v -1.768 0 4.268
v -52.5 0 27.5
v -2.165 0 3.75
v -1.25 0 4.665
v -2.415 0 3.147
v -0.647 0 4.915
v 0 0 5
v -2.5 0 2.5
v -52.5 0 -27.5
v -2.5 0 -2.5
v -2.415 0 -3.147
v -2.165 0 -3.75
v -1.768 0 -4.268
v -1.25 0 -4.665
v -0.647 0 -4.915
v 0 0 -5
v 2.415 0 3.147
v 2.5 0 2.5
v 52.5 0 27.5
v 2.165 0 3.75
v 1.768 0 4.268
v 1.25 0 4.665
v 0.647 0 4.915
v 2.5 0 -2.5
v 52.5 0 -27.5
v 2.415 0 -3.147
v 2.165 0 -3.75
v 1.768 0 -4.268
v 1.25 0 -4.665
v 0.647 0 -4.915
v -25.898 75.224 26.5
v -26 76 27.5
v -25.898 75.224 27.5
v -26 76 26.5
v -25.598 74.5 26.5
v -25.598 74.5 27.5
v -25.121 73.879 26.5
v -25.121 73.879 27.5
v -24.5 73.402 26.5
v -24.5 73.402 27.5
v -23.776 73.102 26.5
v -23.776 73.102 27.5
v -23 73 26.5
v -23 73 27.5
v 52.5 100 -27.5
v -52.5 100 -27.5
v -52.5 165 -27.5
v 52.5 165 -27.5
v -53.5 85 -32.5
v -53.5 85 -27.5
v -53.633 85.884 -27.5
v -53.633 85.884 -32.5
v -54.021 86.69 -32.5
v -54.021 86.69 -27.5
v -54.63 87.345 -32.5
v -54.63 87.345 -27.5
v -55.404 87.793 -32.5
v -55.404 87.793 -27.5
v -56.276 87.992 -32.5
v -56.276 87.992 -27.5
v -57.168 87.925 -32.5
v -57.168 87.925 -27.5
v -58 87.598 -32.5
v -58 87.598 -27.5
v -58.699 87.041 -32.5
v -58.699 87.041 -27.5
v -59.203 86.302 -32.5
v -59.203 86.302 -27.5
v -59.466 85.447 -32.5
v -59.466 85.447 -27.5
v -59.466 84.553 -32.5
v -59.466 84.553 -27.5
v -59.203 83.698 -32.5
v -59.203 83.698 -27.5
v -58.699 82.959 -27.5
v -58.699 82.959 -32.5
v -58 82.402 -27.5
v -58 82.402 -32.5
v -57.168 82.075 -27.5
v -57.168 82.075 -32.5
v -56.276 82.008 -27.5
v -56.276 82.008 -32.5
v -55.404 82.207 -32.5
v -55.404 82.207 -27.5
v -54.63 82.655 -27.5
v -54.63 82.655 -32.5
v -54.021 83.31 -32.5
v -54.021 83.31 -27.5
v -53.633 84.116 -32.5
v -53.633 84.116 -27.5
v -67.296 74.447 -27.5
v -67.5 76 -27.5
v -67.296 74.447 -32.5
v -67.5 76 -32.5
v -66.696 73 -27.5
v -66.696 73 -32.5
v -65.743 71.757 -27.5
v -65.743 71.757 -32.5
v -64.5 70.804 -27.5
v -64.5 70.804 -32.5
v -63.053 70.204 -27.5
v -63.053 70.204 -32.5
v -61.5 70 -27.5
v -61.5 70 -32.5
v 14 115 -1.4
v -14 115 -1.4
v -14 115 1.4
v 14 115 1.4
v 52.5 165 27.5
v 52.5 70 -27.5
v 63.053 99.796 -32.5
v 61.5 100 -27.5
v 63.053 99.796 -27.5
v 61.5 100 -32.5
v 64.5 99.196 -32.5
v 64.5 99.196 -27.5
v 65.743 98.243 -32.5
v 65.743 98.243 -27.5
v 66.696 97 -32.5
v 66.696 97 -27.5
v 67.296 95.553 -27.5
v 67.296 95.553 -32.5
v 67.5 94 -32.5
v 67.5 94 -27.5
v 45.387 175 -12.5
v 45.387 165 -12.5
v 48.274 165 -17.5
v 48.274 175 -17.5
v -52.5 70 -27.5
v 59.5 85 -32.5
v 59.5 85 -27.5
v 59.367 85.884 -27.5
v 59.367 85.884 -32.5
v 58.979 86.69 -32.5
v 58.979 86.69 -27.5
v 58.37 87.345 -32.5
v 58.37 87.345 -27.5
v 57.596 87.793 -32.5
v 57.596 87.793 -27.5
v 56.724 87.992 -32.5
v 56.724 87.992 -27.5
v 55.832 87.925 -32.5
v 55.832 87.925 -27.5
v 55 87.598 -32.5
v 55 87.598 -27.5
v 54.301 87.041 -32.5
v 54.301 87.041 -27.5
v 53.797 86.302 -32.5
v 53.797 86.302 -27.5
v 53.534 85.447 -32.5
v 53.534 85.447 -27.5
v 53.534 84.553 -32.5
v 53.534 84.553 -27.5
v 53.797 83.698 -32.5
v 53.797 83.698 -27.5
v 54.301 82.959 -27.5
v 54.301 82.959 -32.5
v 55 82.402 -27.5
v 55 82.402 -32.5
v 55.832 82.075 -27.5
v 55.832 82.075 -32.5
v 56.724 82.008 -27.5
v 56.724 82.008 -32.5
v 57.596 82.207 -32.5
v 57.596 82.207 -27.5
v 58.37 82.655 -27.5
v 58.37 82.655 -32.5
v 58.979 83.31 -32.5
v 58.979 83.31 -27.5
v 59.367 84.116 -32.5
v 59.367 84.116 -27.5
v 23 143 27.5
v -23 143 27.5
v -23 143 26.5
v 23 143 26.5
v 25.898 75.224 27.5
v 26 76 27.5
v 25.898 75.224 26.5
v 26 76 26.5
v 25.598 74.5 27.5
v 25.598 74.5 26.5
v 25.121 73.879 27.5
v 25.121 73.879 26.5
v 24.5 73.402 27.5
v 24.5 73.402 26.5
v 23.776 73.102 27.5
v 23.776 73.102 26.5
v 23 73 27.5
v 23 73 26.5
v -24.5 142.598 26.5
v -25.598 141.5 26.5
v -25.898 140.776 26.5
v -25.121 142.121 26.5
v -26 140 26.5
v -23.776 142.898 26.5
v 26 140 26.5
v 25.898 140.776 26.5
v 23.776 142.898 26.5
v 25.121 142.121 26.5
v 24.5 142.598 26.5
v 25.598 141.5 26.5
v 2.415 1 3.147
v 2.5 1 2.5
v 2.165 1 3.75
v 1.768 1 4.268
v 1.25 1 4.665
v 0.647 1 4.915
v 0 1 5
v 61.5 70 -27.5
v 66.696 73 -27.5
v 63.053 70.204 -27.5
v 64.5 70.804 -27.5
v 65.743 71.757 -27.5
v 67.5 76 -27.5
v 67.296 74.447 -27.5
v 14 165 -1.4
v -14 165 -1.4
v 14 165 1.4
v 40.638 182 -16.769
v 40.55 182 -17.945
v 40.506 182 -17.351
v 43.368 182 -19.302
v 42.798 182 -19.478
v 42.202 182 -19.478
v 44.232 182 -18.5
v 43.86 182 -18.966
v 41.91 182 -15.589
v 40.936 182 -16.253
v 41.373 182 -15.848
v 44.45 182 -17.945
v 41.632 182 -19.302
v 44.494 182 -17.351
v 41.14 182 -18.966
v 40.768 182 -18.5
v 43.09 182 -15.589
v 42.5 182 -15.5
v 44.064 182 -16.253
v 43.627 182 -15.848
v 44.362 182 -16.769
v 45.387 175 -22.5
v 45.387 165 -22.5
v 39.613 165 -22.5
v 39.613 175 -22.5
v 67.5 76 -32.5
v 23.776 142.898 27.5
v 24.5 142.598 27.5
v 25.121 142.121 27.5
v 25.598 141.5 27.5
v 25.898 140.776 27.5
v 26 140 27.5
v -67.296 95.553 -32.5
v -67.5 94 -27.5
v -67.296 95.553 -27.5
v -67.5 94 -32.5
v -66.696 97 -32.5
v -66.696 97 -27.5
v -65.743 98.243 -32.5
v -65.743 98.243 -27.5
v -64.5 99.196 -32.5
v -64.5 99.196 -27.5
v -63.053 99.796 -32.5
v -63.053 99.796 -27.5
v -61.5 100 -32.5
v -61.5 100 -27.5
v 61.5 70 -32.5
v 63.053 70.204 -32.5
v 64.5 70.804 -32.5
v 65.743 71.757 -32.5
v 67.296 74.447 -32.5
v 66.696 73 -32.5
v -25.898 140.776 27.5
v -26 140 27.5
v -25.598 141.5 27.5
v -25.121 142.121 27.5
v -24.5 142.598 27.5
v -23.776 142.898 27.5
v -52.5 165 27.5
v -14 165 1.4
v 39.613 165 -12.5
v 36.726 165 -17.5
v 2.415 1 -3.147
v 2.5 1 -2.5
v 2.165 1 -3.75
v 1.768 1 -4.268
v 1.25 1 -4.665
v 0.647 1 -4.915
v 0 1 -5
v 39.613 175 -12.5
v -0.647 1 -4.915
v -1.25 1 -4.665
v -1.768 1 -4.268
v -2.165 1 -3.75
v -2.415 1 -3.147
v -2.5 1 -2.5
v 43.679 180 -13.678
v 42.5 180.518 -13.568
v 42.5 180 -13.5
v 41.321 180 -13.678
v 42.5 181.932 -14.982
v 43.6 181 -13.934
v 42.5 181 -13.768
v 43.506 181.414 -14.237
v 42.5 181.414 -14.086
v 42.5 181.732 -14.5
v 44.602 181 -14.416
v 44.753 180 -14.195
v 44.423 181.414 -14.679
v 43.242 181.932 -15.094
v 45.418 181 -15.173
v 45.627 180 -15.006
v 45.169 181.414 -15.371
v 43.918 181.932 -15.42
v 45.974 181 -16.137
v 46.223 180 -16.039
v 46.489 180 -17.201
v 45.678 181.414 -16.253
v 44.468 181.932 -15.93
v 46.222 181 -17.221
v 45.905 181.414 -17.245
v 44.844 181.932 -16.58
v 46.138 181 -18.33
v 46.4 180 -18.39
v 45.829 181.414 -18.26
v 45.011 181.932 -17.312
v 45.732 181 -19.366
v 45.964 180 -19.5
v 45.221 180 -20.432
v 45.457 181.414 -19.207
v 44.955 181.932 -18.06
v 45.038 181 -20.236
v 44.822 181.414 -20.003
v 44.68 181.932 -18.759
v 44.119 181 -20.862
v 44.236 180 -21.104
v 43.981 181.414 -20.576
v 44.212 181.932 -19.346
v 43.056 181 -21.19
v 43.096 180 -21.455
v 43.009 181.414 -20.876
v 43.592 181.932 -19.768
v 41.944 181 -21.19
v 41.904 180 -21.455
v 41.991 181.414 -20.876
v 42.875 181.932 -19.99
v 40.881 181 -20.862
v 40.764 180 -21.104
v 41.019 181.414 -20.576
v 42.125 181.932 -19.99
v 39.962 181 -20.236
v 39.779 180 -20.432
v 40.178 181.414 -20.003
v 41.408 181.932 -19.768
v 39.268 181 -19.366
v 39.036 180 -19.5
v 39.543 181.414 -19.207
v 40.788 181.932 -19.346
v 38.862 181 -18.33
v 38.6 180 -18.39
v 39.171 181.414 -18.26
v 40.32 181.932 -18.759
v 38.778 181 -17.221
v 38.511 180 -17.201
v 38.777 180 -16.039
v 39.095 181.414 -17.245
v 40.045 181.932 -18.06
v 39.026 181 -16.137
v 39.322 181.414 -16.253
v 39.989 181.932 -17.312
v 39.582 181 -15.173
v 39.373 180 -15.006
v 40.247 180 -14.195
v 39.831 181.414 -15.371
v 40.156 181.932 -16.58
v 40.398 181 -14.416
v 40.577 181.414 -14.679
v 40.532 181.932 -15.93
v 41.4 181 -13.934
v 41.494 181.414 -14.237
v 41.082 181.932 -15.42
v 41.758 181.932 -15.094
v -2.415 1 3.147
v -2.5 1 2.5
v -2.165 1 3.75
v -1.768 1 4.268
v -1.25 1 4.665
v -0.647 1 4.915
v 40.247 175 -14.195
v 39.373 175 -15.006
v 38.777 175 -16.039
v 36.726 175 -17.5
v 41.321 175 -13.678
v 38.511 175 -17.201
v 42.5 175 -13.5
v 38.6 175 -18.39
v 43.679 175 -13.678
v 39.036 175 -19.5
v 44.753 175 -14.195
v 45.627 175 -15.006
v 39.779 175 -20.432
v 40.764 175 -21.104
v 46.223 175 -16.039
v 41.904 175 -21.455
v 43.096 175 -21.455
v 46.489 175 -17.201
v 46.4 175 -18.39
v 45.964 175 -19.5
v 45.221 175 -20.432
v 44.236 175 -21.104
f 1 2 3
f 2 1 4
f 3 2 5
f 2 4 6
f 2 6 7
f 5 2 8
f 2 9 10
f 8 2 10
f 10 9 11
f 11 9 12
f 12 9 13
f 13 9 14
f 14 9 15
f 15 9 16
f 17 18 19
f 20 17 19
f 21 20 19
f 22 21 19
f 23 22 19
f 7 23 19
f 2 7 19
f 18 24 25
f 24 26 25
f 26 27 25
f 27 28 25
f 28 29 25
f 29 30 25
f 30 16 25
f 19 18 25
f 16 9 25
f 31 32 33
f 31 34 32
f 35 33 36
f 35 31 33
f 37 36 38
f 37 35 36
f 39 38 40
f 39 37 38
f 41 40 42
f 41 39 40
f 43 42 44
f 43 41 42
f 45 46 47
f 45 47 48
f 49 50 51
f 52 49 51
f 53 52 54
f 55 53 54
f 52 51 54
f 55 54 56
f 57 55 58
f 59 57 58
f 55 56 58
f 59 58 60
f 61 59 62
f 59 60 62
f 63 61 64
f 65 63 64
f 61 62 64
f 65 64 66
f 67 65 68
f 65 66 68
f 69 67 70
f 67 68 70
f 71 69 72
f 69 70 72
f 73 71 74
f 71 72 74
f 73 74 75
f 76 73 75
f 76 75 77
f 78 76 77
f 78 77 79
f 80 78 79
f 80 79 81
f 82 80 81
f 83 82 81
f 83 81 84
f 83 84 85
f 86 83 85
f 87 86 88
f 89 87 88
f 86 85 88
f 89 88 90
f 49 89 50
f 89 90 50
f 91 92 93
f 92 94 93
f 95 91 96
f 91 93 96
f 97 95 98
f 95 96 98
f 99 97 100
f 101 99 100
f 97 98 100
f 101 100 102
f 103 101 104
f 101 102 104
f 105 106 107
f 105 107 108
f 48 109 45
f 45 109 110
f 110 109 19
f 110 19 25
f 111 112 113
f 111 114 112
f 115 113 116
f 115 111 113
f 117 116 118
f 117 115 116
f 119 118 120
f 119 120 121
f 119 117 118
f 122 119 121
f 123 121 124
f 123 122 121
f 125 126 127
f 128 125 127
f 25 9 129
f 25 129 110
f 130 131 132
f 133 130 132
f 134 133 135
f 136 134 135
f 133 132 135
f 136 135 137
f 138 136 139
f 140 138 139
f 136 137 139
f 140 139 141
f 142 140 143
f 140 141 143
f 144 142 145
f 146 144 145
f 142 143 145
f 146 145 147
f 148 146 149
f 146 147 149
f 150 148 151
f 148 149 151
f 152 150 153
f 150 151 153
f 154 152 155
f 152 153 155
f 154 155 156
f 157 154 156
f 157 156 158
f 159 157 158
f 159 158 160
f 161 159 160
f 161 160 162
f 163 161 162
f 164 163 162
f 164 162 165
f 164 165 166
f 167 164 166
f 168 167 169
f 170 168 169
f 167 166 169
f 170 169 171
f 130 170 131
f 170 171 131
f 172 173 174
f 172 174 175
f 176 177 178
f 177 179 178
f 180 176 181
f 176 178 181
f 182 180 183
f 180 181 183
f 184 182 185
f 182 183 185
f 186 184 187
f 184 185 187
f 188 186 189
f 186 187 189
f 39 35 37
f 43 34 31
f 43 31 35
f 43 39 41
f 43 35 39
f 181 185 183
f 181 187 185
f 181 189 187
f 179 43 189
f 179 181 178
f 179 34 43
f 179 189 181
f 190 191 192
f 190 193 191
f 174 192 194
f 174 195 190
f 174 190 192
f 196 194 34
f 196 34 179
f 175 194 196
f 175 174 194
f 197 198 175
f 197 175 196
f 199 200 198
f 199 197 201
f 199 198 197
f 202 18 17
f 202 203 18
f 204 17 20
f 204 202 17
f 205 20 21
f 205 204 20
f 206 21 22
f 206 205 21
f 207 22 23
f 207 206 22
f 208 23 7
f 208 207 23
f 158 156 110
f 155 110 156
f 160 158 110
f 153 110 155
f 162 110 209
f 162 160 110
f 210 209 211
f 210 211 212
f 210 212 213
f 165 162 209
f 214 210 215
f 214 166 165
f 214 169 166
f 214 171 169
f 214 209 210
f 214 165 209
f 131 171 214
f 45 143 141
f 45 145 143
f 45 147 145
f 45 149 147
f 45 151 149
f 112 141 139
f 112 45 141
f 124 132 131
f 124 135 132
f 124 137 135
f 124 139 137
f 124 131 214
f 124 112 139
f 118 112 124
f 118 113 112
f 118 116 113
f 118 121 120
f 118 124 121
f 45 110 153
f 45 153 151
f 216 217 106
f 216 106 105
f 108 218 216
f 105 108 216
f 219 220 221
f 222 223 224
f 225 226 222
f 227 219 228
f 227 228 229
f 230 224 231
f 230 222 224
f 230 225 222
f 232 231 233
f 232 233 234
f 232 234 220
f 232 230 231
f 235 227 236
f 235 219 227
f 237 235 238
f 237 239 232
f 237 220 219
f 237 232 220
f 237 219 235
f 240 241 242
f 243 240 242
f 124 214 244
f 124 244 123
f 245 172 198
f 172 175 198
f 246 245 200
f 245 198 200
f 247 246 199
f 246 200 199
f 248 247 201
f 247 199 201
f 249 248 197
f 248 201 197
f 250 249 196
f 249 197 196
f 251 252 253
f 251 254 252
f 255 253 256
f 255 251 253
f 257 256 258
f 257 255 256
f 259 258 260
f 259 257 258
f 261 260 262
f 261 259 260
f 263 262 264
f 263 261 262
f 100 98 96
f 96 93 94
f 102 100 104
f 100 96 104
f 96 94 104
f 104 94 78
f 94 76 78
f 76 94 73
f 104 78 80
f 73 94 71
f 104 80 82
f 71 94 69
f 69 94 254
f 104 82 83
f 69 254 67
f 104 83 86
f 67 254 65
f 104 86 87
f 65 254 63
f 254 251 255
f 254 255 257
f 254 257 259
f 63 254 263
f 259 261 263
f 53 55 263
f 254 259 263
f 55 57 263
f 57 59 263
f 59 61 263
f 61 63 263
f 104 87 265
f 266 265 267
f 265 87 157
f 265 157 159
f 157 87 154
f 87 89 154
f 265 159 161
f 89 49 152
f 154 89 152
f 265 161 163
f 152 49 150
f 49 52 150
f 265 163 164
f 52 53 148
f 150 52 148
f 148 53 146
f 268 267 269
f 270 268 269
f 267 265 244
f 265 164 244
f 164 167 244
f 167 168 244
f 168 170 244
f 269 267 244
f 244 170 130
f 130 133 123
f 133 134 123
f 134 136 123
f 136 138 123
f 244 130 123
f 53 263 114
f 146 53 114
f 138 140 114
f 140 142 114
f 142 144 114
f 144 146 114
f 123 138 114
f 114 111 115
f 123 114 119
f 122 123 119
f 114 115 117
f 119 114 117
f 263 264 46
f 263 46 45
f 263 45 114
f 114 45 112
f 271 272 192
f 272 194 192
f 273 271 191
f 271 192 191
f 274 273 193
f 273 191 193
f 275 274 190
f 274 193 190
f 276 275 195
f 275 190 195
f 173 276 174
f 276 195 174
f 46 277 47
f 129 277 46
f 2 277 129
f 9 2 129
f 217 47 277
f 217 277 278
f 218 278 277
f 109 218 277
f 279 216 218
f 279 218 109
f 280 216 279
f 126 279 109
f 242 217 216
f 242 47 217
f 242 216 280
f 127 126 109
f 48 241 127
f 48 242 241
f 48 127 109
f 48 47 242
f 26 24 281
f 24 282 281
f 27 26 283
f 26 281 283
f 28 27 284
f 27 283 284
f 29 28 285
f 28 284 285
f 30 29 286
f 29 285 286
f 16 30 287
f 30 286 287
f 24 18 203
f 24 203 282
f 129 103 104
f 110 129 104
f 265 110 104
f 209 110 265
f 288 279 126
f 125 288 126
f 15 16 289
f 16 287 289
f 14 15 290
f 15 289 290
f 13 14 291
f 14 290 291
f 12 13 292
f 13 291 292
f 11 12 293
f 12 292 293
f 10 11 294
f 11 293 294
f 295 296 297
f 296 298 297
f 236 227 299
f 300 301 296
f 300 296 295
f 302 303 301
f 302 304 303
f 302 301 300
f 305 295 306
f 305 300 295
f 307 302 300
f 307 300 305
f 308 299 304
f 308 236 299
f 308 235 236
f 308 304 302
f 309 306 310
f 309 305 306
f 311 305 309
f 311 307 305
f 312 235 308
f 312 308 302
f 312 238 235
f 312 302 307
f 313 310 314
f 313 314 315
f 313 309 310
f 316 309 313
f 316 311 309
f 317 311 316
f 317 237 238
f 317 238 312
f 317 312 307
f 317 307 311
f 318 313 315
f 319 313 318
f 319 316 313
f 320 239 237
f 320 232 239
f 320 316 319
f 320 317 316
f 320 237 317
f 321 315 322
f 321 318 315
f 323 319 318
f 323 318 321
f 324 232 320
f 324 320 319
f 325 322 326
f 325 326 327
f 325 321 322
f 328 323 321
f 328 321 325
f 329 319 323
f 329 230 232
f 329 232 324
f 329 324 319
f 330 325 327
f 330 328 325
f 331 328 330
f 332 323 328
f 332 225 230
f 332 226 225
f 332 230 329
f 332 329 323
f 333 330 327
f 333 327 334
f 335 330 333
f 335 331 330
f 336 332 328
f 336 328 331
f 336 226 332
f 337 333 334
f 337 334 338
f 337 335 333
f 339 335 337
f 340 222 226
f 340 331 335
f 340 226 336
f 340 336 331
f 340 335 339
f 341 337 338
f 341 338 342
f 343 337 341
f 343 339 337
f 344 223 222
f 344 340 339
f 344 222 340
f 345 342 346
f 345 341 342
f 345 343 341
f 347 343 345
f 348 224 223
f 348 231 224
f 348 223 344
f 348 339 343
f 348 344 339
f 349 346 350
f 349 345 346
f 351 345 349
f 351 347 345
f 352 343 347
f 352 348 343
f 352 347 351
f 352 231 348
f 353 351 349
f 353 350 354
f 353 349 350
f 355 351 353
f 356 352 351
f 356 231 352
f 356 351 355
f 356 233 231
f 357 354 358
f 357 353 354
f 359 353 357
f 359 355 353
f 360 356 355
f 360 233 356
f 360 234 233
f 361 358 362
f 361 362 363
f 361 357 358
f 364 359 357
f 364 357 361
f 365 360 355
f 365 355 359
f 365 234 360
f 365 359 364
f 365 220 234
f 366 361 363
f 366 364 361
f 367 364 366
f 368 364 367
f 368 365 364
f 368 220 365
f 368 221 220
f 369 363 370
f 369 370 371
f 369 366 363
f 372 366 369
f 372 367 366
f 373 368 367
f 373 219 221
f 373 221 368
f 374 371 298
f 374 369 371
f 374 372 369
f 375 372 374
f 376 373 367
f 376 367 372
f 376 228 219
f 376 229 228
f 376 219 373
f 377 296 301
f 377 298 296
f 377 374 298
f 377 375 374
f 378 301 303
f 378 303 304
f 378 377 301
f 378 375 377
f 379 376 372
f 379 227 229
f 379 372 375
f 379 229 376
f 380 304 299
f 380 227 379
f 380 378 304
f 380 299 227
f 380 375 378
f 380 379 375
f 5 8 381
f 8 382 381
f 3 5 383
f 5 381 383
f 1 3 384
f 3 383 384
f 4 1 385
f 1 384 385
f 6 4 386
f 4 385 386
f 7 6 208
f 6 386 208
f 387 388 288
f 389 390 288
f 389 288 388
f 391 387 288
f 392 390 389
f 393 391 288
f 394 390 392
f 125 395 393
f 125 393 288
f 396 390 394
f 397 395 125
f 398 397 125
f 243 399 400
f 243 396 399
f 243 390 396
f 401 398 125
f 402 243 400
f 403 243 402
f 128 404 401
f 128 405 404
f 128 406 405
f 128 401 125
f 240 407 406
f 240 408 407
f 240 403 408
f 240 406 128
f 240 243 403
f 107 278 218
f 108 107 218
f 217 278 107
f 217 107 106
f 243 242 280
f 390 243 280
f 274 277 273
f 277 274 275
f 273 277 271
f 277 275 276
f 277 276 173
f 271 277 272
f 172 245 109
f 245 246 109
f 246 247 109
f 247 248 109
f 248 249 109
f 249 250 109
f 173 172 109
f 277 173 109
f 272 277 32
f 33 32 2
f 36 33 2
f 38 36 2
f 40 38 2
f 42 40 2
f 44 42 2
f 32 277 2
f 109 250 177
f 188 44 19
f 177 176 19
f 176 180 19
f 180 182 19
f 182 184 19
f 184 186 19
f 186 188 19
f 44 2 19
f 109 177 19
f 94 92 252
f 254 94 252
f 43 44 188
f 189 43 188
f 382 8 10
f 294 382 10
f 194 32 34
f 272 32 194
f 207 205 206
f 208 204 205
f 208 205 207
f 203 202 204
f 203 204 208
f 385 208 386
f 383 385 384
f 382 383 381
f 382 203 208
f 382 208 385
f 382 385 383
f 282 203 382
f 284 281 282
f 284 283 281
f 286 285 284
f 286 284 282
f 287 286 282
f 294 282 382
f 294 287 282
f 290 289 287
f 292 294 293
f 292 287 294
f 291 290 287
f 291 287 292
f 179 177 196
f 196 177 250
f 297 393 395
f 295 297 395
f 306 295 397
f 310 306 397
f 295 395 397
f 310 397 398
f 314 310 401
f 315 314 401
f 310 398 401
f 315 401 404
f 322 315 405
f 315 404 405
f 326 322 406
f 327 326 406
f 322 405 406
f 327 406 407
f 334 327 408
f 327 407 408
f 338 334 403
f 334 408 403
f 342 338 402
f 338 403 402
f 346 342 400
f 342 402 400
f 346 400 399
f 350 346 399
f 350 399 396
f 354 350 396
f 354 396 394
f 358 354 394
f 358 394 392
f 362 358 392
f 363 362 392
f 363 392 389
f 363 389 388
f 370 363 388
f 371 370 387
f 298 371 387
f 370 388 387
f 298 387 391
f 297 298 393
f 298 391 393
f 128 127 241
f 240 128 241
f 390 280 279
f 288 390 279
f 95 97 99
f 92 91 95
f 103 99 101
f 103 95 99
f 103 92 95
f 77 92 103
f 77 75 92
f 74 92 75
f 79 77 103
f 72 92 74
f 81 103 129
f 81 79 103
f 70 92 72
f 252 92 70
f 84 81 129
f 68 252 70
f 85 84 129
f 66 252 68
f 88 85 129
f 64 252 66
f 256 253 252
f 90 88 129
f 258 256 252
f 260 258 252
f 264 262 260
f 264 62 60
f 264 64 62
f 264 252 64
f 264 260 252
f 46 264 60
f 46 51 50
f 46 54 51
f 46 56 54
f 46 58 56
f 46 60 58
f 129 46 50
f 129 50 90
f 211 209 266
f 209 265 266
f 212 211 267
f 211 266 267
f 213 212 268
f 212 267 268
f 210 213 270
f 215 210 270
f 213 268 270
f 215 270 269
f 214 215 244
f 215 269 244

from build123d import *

# Parameters (mm, degrees)
SKETCH1_W           = 105
SKETCH1_H           = 55
BOSS_EXTRUDE1_DEPTH = 165
SKETCH2_W           = 28
SKETCH2_H           = 2.8
CUT_EXTRUDE1_DEPTH  = 50
BOSS_EXTRUDE2_START = 165
BOSS_EXTRUDE2_DEPTH = 10
SKETCH4_R           = 4
BOSS_EXTRUDE3_DEPTH = 7
FILLET1_R           = 2
CUT_EXTRUDE2_START  = 27.5
SKETCH5_W           = 52
SKETCH5_H           = 70
CUT_EXTRUDE2_DEPTH  = 1
SKETCH6_W           = 5
SKETCH6_H           = 10
CUT_EXTRUDE3_DEPTH  = 1
FILLET2_R           = 2.5
BOSS_EXTRUDE4_START = -27.5
SKETCH7_W           = 135
SKETCH7_H           = 30
SKETCH7_R           = 3
BOSS_EXTRUDE4_DEPTH = 5
FILLET3_R           = 6
FILLET4_R           = 3


with BuildPart() as part:
    # Sketch1 → Boss-Extrude1 (new body)
    with BuildSketch(Plane(origin=(0, 0, 0), x_dir=(1, 0, 0), z_dir=(0, 1, 0))):
        Rectangle(SKETCH1_W, SKETCH1_H)
    extrude(amount=BOSS_EXTRUDE1_DEPTH)

    # Sketch2 → Cut-Extrude1 (cut)
    with BuildSketch(Plane(origin=(0, 165, 0), x_dir=(1, 0, 0), z_dir=(0, 1, 0))):
        Rectangle(SKETCH2_W, SKETCH2_H)
    extrude(amount=-CUT_EXTRUDE1_DEPTH, mode=Mode.SUBTRACT)

    # Sketch3 → Boss-Extrude2 (add)
    with BuildSketch(Plane(origin=(0, 0, 0), x_dir=(1, 0, 0), z_dir=(0, 1, 0)).offset(BOSS_EXTRUDE2_START)):
        Polygon((48.273502692, 17.5), (45.386751346, 22.5), (39.613248654, 22.5), (36.726497308, 17.5), (39.613248654, 12.5), (45.386751346, 12.5), align=None)
    extrude(amount=BOSS_EXTRUDE2_DEPTH)

    # Sketch4 → Boss-Extrude3 (add)
    with BuildSketch(Plane(origin=(0, 175, 0), x_dir=(1, 0, 0), z_dir=(0, 1, 0))):
        with Locations(Location((42.5, 17.5, 0), (0, 0, 270))):
            Circle(SKETCH4_R)
    extrude(amount=BOSS_EXTRUDE3_DEPTH)

    # Fillet1
    fillet1_edges = [part.edges().sort_by_distance(p)[0] for p in [
        (42.5, 182, -21.5),
    ]]
    fillet(fillet1_edges, radius=FILLET1_R)

    # Sketch5 → Cut-Extrude2 (cut)
    with BuildSketch(Plane.XY.offset(CUT_EXTRUDE2_START)):
        with Locations((0, 108)):
            Rectangle(SKETCH5_W, SKETCH5_H)
    extrude(amount=-CUT_EXTRUDE2_DEPTH, mode=Mode.SUBTRACT)

    # Sketch6 → Cut-Extrude3 (cut)
    with BuildSketch(Plane(origin=(0, 0, 0), x_dir=(-1, 0, 0), z_dir=(0, -1, 0))):
        Rectangle(SKETCH6_W, SKETCH6_H)
    extrude(amount=-CUT_EXTRUDE3_DEPTH, mode=Mode.SUBTRACT)

    # Fillet2
    fillet2_edges = [part.edges().sort_by_distance(p)[0] for p in [
        (-2.5, 0.5, -5),
        (2.5, 0.5, -5),
        (2.5, 0.5, 5),
        (-2.5, 0.5, 5),
    ]]
    fillet(fillet2_edges, radius=FILLET2_R - 0.0001)  # a hair under: the kernel refuses the full size

    # Sketch7 → Boss-Extrude4 (add)
    with BuildSketch(Plane.XY.offset(BOSS_EXTRUDE4_START)):
        with Locations((0, 85)):
            Rectangle(SKETCH7_W, SKETCH7_H)
        with Locations((-56.5, 85)):
            Circle(SKETCH7_R, mode=Mode.SUBTRACT)
        with Locations((56.5, 85)):
            Circle(SKETCH7_R, mode=Mode.SUBTRACT)
    extrude(amount=-BOSS_EXTRUDE4_DEPTH)

    # Fillet3
    fillet3_edges = [part.edges().sort_by_distance(p)[0] for p in [
        (67.5, 70, -30),
        (-67.5, 70, -30),
        (-67.5, 100, -30),
        (67.5, 100, -30),
    ]]
    fillet(fillet3_edges, radius=FILLET3_R)

    # Fillet4
    fillet4_edges = [part.edges().sort_by_distance(p)[0] for p in [
        (26, 143, 27),
        (26, 73, 27),
        (-26, 73, 27),
        (-26, 143, 27),
    ]]
    fillet(fillet4_edges, radius=FILLET4_R)


solid = part.part
